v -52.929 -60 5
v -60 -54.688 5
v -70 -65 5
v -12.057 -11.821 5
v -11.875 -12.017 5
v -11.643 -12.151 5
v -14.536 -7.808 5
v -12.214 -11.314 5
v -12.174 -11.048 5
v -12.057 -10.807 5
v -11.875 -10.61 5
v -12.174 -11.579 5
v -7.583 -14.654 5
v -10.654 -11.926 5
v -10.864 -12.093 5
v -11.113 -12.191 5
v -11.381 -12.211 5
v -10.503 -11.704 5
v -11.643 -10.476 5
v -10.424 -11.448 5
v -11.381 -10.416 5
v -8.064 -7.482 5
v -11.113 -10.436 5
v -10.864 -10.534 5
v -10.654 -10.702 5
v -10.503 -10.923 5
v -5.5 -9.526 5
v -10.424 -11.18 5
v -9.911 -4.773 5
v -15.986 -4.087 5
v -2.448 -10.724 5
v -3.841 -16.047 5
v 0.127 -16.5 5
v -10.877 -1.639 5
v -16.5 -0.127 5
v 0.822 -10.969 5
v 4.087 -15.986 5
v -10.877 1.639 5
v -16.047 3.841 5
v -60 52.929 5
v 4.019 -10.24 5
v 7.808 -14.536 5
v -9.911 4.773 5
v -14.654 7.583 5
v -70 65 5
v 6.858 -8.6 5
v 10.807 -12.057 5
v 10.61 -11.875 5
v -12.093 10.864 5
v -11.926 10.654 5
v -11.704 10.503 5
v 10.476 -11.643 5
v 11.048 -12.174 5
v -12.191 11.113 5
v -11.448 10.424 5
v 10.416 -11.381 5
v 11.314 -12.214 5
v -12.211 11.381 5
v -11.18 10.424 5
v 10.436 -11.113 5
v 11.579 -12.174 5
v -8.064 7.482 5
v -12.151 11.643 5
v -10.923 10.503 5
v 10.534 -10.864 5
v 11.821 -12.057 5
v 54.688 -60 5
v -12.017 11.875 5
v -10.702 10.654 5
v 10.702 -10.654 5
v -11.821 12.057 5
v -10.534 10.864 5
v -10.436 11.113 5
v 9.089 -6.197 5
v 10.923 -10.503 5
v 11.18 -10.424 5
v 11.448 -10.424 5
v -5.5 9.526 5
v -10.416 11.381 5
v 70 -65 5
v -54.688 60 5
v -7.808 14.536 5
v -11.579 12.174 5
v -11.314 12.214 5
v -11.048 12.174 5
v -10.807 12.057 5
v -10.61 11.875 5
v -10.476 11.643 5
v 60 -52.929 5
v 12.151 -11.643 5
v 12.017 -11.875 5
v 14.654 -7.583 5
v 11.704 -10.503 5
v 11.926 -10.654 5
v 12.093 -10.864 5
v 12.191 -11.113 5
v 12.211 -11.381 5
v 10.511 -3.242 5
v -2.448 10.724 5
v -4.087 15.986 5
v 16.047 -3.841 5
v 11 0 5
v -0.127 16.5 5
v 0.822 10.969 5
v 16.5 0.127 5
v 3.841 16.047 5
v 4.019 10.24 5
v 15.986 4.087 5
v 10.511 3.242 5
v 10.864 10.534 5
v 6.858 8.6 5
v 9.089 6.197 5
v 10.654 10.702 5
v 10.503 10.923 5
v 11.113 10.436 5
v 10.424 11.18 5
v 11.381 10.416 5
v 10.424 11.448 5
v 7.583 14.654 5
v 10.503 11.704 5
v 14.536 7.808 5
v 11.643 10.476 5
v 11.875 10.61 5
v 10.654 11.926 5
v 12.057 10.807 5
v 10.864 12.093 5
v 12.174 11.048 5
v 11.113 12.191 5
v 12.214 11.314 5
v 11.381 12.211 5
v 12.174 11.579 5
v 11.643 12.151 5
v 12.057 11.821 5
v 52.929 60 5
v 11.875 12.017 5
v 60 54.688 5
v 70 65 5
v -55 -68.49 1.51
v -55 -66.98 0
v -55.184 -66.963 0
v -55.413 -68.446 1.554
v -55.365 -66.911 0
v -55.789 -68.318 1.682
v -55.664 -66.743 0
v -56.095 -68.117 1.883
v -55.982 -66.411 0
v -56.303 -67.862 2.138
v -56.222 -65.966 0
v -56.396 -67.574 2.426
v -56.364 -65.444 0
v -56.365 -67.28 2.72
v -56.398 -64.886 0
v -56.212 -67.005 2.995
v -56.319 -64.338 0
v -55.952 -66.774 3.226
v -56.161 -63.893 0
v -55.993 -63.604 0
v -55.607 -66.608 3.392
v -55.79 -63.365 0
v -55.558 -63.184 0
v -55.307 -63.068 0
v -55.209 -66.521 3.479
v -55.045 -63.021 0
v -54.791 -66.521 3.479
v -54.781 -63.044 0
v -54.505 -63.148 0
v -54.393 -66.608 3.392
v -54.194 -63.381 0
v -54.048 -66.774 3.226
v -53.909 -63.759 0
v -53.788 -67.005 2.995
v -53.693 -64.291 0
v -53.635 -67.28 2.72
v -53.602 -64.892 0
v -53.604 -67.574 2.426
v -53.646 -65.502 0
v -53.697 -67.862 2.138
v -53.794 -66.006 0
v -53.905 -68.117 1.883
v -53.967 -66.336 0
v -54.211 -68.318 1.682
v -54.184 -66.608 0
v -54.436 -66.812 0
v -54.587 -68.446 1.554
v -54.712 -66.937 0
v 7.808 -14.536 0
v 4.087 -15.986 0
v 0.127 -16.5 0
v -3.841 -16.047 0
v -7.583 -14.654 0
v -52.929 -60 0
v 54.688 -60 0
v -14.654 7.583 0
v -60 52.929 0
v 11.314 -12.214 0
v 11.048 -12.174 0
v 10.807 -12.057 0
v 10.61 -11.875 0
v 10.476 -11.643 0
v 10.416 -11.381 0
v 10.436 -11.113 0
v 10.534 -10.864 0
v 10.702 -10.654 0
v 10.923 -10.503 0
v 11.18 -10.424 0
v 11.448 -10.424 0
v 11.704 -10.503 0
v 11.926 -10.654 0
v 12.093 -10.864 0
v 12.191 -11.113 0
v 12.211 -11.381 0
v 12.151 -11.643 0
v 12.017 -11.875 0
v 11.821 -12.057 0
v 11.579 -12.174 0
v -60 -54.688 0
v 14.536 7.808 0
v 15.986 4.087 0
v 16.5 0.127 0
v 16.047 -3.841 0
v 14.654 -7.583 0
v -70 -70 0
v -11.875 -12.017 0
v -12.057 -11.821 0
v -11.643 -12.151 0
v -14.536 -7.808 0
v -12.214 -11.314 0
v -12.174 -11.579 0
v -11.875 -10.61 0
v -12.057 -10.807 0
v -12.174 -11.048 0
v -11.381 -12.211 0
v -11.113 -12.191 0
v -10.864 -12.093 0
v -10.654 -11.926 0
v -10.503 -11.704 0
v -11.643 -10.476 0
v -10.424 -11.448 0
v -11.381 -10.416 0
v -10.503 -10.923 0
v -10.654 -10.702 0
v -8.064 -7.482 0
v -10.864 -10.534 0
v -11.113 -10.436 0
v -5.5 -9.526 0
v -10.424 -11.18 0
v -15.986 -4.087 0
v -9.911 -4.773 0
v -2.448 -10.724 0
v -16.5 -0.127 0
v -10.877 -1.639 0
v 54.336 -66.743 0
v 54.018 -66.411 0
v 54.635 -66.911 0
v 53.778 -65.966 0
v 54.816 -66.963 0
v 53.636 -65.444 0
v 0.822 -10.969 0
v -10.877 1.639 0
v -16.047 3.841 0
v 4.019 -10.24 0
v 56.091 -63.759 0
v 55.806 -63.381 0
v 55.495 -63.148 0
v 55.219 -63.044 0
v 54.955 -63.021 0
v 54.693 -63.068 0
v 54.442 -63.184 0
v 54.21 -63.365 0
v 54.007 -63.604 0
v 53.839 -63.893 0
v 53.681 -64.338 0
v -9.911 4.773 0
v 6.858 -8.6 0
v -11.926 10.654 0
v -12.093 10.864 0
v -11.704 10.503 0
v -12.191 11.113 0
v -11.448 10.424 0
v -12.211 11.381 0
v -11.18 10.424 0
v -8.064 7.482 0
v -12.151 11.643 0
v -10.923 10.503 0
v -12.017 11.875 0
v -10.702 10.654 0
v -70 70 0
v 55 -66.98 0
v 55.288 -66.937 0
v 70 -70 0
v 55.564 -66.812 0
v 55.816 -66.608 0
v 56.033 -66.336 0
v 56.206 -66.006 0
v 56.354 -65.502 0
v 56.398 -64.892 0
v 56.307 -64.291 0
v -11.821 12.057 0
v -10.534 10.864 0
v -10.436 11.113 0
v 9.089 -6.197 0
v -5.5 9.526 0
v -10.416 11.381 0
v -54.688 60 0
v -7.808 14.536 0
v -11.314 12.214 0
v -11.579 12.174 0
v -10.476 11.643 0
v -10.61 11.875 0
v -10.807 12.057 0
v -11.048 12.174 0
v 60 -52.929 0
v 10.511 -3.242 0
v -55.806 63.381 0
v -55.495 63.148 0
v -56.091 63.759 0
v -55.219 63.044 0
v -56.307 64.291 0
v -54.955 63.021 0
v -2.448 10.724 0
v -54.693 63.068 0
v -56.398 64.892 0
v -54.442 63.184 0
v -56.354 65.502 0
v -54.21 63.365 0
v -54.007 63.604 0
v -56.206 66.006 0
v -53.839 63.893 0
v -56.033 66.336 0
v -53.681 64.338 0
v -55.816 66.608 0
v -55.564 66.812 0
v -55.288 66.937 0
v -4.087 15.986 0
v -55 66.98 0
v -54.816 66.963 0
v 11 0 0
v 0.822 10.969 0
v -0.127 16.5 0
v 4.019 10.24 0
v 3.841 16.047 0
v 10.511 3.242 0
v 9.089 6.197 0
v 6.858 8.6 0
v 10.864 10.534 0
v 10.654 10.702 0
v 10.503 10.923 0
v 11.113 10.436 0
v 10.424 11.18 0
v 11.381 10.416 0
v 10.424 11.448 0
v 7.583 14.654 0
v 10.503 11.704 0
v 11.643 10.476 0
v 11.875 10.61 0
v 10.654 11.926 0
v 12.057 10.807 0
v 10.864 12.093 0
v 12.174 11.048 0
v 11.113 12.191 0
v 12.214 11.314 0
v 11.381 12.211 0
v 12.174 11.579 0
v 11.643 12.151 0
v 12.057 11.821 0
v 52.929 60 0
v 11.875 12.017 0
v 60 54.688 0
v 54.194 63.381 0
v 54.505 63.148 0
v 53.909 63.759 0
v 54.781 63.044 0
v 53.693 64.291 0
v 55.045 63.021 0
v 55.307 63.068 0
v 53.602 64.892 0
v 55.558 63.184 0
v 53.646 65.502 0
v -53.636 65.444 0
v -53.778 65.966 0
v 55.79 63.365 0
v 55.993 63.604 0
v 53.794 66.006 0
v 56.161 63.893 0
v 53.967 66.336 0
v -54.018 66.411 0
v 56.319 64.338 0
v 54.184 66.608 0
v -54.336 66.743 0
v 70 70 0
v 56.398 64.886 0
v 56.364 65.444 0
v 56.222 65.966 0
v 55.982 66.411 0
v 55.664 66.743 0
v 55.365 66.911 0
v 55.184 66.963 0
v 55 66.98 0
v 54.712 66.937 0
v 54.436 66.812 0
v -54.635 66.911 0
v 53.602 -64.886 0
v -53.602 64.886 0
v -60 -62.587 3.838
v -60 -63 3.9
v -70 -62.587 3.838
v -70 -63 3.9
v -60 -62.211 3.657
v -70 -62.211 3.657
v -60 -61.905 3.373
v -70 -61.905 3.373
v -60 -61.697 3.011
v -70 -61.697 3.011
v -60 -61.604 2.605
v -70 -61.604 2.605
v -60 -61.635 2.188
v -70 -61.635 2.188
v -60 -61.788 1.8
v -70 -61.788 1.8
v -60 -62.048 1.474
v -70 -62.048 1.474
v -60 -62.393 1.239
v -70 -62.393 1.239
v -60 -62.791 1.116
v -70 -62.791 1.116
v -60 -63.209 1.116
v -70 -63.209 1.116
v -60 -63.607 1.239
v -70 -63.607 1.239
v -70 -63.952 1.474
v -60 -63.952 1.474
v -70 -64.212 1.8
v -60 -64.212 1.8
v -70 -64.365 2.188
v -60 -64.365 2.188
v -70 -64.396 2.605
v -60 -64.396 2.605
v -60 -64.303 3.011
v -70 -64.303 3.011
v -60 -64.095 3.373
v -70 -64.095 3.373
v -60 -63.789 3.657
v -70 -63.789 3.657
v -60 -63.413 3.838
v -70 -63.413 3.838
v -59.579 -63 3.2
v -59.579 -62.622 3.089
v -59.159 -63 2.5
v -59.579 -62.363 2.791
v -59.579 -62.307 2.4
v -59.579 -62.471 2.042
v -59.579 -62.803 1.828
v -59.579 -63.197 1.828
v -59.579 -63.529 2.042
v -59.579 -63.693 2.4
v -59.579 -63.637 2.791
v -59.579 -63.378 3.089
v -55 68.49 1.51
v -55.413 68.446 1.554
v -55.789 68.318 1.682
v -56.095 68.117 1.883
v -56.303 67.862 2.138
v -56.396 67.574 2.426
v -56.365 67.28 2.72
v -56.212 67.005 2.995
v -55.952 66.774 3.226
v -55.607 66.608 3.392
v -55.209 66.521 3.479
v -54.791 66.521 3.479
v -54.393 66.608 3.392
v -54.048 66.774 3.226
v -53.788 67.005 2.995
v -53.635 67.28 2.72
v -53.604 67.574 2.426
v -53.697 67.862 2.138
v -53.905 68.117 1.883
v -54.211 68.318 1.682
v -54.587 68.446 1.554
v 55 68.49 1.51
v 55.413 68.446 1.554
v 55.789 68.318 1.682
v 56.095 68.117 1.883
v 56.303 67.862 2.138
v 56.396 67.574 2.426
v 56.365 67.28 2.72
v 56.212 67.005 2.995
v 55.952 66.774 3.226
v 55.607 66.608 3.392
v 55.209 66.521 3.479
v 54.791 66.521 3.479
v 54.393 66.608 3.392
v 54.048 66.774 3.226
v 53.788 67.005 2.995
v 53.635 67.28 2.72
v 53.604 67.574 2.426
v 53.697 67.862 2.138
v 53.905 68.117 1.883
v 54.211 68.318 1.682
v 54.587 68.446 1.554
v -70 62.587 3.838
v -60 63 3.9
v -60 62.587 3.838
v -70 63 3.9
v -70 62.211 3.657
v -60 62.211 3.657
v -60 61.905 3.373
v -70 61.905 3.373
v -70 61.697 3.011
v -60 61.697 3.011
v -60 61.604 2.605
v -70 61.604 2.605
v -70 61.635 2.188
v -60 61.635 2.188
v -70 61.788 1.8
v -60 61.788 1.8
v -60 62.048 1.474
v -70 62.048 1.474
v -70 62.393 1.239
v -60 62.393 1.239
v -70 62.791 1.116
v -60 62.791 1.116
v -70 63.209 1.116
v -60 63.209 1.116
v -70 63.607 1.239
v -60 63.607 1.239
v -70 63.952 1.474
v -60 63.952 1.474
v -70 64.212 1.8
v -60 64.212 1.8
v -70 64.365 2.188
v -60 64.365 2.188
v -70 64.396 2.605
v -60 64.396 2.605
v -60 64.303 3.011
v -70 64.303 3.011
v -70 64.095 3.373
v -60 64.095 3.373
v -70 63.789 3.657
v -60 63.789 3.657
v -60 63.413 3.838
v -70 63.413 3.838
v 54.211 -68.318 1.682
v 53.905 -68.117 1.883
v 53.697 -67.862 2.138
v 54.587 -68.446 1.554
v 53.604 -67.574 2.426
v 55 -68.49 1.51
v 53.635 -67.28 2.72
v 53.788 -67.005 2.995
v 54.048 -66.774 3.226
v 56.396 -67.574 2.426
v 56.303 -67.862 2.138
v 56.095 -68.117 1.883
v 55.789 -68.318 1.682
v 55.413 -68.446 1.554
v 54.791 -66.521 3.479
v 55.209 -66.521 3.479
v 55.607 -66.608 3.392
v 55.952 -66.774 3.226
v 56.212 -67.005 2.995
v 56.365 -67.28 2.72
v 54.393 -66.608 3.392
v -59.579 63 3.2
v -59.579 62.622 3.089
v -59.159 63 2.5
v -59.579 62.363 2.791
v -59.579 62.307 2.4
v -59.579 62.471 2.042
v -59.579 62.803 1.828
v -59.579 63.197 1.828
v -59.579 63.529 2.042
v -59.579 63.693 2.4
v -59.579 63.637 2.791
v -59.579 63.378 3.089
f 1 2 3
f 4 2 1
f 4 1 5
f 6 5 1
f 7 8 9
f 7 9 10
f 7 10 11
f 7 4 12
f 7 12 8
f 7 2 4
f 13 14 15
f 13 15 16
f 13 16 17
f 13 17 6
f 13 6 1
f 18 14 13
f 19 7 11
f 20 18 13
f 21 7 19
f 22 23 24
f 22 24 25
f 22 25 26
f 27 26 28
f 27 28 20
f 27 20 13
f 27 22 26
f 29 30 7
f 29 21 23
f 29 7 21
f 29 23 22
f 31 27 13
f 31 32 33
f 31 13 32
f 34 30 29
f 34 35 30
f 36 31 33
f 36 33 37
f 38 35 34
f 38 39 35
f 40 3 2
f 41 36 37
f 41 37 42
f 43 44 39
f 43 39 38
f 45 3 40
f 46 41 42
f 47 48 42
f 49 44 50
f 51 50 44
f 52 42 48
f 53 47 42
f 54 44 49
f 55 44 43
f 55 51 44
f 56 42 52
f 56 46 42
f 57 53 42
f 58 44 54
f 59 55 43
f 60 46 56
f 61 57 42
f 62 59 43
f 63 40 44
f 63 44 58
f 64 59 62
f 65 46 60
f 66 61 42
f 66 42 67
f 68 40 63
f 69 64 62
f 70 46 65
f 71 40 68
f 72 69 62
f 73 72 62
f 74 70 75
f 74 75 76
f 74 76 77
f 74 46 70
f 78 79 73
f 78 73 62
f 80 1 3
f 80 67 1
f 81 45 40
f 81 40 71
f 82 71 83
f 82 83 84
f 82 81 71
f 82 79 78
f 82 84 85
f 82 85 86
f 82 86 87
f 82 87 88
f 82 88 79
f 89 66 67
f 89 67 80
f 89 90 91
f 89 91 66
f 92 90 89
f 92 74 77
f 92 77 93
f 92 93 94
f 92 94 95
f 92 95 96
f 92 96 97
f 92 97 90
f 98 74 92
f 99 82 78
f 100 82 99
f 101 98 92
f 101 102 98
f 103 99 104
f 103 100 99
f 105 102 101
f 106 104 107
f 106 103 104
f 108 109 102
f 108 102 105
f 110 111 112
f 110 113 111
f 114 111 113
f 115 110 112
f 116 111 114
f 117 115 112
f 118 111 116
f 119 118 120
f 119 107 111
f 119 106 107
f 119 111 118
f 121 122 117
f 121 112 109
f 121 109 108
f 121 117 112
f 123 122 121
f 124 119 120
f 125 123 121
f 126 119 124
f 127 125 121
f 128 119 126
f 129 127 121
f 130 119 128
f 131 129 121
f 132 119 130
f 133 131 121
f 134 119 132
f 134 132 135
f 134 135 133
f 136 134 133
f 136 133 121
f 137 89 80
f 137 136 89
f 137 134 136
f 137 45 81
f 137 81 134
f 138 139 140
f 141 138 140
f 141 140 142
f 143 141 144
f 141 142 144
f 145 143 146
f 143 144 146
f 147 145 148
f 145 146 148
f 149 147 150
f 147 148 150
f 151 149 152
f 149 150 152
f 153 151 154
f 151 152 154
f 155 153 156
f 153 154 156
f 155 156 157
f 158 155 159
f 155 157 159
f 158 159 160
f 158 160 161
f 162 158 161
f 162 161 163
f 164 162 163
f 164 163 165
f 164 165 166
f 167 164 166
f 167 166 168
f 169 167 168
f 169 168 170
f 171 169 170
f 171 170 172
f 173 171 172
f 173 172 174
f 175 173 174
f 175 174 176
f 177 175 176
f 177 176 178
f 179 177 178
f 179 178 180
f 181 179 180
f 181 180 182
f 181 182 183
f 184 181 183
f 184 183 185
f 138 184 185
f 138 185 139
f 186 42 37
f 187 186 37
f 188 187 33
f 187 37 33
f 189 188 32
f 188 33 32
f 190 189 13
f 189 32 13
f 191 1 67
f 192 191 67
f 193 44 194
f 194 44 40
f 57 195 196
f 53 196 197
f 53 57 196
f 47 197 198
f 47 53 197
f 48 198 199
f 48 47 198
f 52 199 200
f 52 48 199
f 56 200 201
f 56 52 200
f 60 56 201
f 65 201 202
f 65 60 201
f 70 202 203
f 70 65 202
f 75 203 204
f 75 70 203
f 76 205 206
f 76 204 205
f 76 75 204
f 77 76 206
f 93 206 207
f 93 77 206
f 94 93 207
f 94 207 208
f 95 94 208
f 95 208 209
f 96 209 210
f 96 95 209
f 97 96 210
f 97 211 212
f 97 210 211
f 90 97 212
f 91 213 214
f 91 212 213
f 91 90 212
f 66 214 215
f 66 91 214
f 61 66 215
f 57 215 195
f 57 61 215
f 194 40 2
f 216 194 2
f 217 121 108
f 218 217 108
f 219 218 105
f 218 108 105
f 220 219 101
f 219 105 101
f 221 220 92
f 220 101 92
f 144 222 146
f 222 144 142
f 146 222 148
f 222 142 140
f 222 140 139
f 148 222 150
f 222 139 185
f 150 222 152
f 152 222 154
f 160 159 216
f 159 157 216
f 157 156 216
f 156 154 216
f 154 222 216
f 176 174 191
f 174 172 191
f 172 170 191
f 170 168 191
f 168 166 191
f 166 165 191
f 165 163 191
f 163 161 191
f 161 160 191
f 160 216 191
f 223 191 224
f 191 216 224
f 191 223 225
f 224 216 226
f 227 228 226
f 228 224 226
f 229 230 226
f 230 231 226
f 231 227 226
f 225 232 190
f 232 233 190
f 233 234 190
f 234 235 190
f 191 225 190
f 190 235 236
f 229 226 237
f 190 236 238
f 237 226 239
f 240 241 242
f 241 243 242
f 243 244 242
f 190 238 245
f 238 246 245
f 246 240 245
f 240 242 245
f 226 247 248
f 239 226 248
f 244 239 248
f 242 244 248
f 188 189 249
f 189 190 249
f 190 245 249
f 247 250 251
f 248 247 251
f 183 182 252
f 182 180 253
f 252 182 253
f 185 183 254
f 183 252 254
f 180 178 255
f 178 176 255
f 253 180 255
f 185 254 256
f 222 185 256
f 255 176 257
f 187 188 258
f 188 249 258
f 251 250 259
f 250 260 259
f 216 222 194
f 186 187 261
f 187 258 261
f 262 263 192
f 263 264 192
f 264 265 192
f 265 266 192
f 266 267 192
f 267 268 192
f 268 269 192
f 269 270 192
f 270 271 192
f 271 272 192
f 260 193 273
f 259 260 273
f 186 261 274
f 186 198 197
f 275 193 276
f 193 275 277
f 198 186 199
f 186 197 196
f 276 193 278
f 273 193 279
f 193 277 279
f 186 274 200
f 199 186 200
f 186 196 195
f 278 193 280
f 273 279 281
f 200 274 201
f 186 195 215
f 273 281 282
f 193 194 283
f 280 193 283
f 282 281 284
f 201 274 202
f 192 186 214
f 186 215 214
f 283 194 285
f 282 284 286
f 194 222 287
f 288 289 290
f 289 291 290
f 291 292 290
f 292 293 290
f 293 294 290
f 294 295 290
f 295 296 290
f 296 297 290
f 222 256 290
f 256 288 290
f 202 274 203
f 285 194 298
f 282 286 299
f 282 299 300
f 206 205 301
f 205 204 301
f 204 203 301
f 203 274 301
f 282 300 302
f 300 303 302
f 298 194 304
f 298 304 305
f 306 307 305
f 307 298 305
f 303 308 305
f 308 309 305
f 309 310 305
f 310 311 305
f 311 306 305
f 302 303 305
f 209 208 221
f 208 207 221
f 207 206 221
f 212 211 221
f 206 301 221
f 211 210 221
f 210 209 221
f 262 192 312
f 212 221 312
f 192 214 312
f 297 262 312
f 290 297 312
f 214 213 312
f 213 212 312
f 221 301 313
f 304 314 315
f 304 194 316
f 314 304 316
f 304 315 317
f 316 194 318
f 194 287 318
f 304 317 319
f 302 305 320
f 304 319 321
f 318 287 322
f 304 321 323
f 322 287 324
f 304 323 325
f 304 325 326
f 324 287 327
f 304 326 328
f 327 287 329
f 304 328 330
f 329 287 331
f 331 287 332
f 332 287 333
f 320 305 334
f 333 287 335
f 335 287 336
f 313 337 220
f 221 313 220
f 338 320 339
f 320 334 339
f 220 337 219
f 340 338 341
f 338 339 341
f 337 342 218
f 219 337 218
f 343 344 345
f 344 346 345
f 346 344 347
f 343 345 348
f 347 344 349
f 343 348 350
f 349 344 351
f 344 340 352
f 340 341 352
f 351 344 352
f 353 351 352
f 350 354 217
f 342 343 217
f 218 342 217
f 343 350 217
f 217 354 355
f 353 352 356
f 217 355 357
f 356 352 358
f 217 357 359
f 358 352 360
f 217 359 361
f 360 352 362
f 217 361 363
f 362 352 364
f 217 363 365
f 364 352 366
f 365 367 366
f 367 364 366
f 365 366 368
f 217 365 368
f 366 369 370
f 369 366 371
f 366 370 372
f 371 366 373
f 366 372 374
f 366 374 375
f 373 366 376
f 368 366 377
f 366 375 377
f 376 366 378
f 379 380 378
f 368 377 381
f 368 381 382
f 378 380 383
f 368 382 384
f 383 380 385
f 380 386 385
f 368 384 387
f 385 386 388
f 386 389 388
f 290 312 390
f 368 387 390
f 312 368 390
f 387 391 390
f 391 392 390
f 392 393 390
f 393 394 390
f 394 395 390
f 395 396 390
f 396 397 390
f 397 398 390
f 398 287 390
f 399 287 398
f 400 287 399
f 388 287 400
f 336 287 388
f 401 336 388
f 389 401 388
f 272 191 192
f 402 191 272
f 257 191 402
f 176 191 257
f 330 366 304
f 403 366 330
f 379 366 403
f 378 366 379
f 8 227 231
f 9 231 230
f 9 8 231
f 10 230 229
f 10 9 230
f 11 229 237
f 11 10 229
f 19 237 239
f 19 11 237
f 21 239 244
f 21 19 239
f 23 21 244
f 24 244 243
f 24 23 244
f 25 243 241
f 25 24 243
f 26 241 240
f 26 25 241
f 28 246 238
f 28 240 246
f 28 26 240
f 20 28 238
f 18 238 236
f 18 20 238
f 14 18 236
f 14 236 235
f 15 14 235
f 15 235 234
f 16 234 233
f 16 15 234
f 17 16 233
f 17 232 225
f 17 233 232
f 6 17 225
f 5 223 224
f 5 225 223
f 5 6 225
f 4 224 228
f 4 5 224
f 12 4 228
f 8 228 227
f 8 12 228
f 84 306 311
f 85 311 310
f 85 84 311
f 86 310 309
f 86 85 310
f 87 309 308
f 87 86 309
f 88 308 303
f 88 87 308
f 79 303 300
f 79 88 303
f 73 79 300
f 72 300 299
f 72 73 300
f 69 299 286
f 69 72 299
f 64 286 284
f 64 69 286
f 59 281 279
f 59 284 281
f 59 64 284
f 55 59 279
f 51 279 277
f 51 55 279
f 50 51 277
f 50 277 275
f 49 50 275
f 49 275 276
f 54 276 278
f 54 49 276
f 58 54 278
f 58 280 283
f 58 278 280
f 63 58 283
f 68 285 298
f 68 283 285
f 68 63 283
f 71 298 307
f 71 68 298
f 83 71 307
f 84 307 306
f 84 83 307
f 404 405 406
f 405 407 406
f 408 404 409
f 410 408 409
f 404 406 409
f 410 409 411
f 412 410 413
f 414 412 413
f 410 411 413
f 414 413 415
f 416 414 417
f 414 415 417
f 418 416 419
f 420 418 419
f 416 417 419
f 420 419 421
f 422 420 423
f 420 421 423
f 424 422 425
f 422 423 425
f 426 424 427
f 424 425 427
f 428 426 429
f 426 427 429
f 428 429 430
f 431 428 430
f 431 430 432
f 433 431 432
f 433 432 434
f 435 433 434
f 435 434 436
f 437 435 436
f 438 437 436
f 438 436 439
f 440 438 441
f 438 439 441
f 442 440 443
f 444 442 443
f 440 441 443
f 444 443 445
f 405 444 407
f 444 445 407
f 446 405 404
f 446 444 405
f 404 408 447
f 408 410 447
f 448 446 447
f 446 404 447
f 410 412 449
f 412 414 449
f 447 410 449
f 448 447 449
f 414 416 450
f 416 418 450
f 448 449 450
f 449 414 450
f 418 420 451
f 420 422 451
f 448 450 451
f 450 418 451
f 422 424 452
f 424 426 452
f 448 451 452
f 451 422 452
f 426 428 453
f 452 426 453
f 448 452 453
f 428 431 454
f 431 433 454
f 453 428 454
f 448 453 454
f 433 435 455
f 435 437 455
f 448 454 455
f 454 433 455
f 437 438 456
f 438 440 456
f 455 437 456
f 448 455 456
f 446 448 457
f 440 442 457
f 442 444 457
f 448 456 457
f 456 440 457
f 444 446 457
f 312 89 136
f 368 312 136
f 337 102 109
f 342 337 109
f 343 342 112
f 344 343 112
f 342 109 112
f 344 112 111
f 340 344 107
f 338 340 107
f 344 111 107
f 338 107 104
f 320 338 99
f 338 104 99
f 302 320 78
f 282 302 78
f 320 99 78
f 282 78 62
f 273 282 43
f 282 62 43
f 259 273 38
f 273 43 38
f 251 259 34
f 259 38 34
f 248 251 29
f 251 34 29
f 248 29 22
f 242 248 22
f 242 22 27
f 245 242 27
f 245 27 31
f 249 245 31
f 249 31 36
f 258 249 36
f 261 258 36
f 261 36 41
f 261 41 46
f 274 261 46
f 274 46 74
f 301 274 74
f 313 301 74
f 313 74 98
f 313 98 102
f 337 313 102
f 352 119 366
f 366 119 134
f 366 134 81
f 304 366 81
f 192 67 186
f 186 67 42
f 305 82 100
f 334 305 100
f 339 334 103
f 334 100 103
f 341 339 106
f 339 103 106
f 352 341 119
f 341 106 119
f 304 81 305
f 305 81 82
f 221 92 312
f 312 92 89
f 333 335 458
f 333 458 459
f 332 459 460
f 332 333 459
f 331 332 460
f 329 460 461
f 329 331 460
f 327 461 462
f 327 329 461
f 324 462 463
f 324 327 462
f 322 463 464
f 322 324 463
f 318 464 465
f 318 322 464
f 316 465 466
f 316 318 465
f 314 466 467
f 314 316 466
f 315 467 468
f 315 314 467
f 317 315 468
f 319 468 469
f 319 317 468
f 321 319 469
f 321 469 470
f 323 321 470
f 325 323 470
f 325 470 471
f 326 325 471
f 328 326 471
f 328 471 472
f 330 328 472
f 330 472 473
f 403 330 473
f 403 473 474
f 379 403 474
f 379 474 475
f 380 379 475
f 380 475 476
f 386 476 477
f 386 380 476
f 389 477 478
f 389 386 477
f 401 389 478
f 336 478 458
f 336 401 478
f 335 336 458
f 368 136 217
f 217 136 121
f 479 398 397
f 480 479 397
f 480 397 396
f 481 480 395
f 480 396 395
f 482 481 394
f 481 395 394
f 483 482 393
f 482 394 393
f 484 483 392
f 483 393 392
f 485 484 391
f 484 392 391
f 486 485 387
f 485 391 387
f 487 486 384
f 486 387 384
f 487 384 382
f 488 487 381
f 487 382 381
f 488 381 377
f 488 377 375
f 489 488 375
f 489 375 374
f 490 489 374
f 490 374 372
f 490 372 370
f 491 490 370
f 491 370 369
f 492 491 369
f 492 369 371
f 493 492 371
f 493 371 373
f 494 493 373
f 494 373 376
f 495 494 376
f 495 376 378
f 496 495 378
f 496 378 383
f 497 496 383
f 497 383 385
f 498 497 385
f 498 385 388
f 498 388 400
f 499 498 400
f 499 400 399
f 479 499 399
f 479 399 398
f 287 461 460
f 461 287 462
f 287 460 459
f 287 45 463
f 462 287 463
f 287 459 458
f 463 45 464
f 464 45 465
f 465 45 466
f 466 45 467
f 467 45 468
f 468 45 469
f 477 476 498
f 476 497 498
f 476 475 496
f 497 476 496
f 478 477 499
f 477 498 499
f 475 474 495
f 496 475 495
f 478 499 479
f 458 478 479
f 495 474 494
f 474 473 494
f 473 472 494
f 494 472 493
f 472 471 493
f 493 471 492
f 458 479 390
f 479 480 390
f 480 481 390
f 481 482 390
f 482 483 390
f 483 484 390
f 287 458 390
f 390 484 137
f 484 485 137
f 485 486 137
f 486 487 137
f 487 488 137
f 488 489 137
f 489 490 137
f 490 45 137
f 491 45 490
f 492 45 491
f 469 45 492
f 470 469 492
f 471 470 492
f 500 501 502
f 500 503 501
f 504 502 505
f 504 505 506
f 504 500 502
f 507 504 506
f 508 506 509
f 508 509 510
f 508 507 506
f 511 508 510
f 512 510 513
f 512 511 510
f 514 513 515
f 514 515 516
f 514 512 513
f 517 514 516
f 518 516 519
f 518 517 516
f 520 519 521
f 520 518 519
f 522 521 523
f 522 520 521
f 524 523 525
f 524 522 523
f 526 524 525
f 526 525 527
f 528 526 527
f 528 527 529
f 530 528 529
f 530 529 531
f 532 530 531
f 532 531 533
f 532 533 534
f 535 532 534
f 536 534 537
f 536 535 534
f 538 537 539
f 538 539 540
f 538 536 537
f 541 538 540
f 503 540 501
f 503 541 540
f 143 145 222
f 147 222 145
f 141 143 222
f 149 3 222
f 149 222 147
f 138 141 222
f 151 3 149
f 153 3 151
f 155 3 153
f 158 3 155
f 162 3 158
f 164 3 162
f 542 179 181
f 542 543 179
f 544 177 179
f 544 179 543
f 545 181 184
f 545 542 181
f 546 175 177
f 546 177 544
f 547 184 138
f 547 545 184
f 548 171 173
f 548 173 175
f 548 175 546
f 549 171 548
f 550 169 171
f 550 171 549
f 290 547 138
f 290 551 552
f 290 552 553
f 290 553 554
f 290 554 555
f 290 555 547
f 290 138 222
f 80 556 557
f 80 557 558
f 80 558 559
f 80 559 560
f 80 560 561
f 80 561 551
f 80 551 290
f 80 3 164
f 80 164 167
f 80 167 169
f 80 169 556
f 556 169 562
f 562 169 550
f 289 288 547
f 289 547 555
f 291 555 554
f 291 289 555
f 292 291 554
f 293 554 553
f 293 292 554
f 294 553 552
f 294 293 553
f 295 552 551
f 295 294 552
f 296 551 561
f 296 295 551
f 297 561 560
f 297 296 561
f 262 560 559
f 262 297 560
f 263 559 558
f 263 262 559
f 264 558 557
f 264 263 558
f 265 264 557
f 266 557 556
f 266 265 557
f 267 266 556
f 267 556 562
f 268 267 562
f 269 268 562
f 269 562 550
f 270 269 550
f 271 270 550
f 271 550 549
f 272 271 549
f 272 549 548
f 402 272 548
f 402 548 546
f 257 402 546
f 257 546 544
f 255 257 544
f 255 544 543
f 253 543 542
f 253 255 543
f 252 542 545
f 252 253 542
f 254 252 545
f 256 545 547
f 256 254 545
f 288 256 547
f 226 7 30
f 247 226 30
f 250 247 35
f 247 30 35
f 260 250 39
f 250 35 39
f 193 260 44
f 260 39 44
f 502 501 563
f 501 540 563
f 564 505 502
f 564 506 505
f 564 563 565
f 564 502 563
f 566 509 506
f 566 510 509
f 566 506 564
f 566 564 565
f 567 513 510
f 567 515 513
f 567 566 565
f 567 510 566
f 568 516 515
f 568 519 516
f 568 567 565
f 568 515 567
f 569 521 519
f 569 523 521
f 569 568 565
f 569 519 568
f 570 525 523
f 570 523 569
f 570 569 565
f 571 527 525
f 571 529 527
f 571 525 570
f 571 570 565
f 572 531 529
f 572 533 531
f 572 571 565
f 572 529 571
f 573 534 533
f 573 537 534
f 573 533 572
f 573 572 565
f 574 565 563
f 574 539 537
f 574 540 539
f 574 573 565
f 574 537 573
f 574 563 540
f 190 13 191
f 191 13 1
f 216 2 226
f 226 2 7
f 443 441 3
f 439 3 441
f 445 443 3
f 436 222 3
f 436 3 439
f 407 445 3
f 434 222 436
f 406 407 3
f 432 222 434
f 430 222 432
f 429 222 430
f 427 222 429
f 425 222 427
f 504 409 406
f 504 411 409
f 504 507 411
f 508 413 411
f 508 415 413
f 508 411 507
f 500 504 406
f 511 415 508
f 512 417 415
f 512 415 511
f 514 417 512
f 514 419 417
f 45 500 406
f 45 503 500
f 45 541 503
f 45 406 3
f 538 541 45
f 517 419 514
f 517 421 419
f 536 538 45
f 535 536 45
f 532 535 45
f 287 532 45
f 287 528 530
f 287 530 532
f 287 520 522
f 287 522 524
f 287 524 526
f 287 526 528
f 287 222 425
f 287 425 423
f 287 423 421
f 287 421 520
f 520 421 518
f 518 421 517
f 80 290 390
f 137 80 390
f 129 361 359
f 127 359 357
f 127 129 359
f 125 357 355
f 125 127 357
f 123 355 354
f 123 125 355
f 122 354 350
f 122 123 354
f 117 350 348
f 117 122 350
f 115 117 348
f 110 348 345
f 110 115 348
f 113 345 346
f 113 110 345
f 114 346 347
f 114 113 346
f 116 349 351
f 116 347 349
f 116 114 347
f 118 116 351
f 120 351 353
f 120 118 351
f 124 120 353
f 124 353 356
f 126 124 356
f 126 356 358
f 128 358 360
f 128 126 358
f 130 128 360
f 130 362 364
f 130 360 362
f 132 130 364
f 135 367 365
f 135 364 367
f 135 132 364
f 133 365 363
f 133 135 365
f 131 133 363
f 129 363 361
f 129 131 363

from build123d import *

# Parameters (mm, degrees)
SKETCH3_W                 = 140
SKETCH3_H                 = 140
BOSS_EXTRUDE1_DEPTH       = 5
CUT_EXTRUDE1_DEPTH        = 5
CIRPATTERN1_COUNT         = 4
CUT_EXTRUDE2_REACH        = 101.121
SKETCH7_R                 = 11
CIRPATTERN2_COUNT         = 4
CHAMFER1_SIZE             = 5
F_3_0MM_DOWEL_HOLE2_D     = 2.8
F_3_0MM_DOWEL_HOLE2_DEPTH = 10
MIRROR3_COPY_1_D          = 2.8
MIRROR3_COPY_1_DEPTH      = 10


with BuildPart() as part:
    # Sketch3 → Boss-Extrude1 (new body)
    with BuildSketch(Plane.XY):
        Rectangle(SKETCH3_W, SKETCH3_H)
    extrude(amount=BOSS_EXTRUDE1_DEPTH)

    # Sketch4 → Cut-Extrude1 (cut)
    with BuildSketch(Plane.XY.offset(5)):
        with BuildLine():
            Line((7.583144073, 14.654211885), (52.928932188, 60))
            Line((52.928932188, 60), (-54.688394727, 60))
            Line((-54.688394727, 60), (-7.80758307, 14.53587447))
            ThreePointArc((-7.80758307, 14.53587447), (-0.126862728, 16.499512291), (7.583144073, 14.654211885))
        make_face()
    cut_extrude1 = extrude(amount=-CUT_EXTRUDE1_DEPTH, mode=Mode.SUBTRACT)

    # CirPattern1: Cut-Extrude1 ×4 about axis
    cirpattern1_axis = Axis((0, 0, 0), (0, 0, 1))
    for i in range(1, CIRPATTERN1_COUNT):
        add(cut_extrude1.rotate(cirpattern1_axis, i * 360 / CIRPATTERN1_COUNT), mode=Mode.SUBTRACT)

    # Sketch7 → Cut-Extrude2 (cut, up to next)
    with BuildSketch(Plane.XY.offset(5), mode=Mode.PRIVATE) as cut_extrude2_sk1:
        Circle(SKETCH7_R)
    cut_extrude2_tool1 = extrude(cut_extrude2_sk1.sketch, amount=-CUT_EXTRUDE2_REACH, mode=Mode.PRIVATE) & part.part
    add(cut_extrude2_tool1.solids().sort_by_distance((0, 0, 5))[0], mode=Mode.SUBTRACT)

    # Sketch9 → Ø1.8 (1.8) Diameter Hole1 (revolve, cut)
    with BuildSketch(Plane(origin=(11.313708499, -11.313708499, 5), x_dir=(0, -1, 0), z_dir=(1, 0, 0))):
        Polygon((0, 0), (0, 6.540774557), (0.9, 6), (0.9, 0), align=None)
    f_1_8_1_8_diameter_hole1 = revolve(axis=Axis((11.313708499, -11.313708499, 11.35), (0, 0, -1)), mode=Mode.SUBTRACT)

    # CirPattern2: Ø1.8 (1.8) Diameter Hole1 ×4 about axis
    cirpattern2_axis = Axis((0, 0, 0), (0, 0, 1))
    for i in range(1, CIRPATTERN2_COUNT):
        add(f_1_8_1_8_diameter_hole1.rotate(cirpattern2_axis, i * 360 / CIRPATTERN2_COUNT), mode=Mode.SUBTRACT)

    # Chamfer1
    chamfer1_edges = [part.edges().sort_by_distance(p)[0] for p in [
        (0, 70, 5),
        (0, -70, 5),
    ]]
    chamfer(chamfer1_edges, length=CHAMFER1_SIZE - 0.0001)  # a hair under: the kernel refuses the full size

    # Sketch12 → Ø3.0mm Dowel Hole1 (revolve, cut)
    with BuildSketch(Plane(origin=(-70, 63, 2.5), x_dir=(0, 0, 1), z_dir=(0, 1, 0))):
        Polygon((0, 0), (0, 10.841204867), (1.4, 10), (1.4, 0), align=None)
    f_3_0mm_dowel_hole1 = revolve(axis=Axis((-76.35, 63, 2.5), (1, 0, 0)), mode=Mode.SUBTRACT)

    # Mirror1: Ø3.0mm Dowel Hole1 across plane
    add(f_3_0mm_dowel_hole1.mirror(Plane.ZX), mode=Mode.SUBTRACT)

    # Ø3.0mm Dowel Hole2
    with Locations(Plane(origin=(55, 67.5, 2.5), x_dir=(0, -0.707106781187, 0.707106781187), z_dir=(0, 0.707106781187, 0.707106781187))):
        with Locations((0, 0)):
            f_3_0mm_dowel_hole2 = Hole(F_3_0MM_DOWEL_HOLE2_D / 2, depth=F_3_0MM_DOWEL_HOLE2_DEPTH)

    # Mirror2: Ø3.0mm Dowel Hole2 across plane
    add(f_3_0mm_dowel_hole2.mirror(Plane(origin=(0, 0, 0), x_dir=(0, 0, 1), z_dir=(1, 0, 0))), mode=Mode.SUBTRACT)

    # Mirror3: Ø3.0mm Dowel Hole2 across plane
    add(f_3_0mm_dowel_hole2.mirror(Plane.ZX), mode=Mode.SUBTRACT)

    # Mirror3 copy 1
    with Locations(Plane(origin=(-55, -67.5, 2.5), x_dir=(0, 0.707106781187, 0.707106781187), z_dir=(0, -0.707106781187, 0.707106781187))):
        with Locations((0, 0)):
            Hole(MIRROR3_COPY_1_D / 2, depth=MIRROR3_COPY_1_DEPTH)


solid = part.part
